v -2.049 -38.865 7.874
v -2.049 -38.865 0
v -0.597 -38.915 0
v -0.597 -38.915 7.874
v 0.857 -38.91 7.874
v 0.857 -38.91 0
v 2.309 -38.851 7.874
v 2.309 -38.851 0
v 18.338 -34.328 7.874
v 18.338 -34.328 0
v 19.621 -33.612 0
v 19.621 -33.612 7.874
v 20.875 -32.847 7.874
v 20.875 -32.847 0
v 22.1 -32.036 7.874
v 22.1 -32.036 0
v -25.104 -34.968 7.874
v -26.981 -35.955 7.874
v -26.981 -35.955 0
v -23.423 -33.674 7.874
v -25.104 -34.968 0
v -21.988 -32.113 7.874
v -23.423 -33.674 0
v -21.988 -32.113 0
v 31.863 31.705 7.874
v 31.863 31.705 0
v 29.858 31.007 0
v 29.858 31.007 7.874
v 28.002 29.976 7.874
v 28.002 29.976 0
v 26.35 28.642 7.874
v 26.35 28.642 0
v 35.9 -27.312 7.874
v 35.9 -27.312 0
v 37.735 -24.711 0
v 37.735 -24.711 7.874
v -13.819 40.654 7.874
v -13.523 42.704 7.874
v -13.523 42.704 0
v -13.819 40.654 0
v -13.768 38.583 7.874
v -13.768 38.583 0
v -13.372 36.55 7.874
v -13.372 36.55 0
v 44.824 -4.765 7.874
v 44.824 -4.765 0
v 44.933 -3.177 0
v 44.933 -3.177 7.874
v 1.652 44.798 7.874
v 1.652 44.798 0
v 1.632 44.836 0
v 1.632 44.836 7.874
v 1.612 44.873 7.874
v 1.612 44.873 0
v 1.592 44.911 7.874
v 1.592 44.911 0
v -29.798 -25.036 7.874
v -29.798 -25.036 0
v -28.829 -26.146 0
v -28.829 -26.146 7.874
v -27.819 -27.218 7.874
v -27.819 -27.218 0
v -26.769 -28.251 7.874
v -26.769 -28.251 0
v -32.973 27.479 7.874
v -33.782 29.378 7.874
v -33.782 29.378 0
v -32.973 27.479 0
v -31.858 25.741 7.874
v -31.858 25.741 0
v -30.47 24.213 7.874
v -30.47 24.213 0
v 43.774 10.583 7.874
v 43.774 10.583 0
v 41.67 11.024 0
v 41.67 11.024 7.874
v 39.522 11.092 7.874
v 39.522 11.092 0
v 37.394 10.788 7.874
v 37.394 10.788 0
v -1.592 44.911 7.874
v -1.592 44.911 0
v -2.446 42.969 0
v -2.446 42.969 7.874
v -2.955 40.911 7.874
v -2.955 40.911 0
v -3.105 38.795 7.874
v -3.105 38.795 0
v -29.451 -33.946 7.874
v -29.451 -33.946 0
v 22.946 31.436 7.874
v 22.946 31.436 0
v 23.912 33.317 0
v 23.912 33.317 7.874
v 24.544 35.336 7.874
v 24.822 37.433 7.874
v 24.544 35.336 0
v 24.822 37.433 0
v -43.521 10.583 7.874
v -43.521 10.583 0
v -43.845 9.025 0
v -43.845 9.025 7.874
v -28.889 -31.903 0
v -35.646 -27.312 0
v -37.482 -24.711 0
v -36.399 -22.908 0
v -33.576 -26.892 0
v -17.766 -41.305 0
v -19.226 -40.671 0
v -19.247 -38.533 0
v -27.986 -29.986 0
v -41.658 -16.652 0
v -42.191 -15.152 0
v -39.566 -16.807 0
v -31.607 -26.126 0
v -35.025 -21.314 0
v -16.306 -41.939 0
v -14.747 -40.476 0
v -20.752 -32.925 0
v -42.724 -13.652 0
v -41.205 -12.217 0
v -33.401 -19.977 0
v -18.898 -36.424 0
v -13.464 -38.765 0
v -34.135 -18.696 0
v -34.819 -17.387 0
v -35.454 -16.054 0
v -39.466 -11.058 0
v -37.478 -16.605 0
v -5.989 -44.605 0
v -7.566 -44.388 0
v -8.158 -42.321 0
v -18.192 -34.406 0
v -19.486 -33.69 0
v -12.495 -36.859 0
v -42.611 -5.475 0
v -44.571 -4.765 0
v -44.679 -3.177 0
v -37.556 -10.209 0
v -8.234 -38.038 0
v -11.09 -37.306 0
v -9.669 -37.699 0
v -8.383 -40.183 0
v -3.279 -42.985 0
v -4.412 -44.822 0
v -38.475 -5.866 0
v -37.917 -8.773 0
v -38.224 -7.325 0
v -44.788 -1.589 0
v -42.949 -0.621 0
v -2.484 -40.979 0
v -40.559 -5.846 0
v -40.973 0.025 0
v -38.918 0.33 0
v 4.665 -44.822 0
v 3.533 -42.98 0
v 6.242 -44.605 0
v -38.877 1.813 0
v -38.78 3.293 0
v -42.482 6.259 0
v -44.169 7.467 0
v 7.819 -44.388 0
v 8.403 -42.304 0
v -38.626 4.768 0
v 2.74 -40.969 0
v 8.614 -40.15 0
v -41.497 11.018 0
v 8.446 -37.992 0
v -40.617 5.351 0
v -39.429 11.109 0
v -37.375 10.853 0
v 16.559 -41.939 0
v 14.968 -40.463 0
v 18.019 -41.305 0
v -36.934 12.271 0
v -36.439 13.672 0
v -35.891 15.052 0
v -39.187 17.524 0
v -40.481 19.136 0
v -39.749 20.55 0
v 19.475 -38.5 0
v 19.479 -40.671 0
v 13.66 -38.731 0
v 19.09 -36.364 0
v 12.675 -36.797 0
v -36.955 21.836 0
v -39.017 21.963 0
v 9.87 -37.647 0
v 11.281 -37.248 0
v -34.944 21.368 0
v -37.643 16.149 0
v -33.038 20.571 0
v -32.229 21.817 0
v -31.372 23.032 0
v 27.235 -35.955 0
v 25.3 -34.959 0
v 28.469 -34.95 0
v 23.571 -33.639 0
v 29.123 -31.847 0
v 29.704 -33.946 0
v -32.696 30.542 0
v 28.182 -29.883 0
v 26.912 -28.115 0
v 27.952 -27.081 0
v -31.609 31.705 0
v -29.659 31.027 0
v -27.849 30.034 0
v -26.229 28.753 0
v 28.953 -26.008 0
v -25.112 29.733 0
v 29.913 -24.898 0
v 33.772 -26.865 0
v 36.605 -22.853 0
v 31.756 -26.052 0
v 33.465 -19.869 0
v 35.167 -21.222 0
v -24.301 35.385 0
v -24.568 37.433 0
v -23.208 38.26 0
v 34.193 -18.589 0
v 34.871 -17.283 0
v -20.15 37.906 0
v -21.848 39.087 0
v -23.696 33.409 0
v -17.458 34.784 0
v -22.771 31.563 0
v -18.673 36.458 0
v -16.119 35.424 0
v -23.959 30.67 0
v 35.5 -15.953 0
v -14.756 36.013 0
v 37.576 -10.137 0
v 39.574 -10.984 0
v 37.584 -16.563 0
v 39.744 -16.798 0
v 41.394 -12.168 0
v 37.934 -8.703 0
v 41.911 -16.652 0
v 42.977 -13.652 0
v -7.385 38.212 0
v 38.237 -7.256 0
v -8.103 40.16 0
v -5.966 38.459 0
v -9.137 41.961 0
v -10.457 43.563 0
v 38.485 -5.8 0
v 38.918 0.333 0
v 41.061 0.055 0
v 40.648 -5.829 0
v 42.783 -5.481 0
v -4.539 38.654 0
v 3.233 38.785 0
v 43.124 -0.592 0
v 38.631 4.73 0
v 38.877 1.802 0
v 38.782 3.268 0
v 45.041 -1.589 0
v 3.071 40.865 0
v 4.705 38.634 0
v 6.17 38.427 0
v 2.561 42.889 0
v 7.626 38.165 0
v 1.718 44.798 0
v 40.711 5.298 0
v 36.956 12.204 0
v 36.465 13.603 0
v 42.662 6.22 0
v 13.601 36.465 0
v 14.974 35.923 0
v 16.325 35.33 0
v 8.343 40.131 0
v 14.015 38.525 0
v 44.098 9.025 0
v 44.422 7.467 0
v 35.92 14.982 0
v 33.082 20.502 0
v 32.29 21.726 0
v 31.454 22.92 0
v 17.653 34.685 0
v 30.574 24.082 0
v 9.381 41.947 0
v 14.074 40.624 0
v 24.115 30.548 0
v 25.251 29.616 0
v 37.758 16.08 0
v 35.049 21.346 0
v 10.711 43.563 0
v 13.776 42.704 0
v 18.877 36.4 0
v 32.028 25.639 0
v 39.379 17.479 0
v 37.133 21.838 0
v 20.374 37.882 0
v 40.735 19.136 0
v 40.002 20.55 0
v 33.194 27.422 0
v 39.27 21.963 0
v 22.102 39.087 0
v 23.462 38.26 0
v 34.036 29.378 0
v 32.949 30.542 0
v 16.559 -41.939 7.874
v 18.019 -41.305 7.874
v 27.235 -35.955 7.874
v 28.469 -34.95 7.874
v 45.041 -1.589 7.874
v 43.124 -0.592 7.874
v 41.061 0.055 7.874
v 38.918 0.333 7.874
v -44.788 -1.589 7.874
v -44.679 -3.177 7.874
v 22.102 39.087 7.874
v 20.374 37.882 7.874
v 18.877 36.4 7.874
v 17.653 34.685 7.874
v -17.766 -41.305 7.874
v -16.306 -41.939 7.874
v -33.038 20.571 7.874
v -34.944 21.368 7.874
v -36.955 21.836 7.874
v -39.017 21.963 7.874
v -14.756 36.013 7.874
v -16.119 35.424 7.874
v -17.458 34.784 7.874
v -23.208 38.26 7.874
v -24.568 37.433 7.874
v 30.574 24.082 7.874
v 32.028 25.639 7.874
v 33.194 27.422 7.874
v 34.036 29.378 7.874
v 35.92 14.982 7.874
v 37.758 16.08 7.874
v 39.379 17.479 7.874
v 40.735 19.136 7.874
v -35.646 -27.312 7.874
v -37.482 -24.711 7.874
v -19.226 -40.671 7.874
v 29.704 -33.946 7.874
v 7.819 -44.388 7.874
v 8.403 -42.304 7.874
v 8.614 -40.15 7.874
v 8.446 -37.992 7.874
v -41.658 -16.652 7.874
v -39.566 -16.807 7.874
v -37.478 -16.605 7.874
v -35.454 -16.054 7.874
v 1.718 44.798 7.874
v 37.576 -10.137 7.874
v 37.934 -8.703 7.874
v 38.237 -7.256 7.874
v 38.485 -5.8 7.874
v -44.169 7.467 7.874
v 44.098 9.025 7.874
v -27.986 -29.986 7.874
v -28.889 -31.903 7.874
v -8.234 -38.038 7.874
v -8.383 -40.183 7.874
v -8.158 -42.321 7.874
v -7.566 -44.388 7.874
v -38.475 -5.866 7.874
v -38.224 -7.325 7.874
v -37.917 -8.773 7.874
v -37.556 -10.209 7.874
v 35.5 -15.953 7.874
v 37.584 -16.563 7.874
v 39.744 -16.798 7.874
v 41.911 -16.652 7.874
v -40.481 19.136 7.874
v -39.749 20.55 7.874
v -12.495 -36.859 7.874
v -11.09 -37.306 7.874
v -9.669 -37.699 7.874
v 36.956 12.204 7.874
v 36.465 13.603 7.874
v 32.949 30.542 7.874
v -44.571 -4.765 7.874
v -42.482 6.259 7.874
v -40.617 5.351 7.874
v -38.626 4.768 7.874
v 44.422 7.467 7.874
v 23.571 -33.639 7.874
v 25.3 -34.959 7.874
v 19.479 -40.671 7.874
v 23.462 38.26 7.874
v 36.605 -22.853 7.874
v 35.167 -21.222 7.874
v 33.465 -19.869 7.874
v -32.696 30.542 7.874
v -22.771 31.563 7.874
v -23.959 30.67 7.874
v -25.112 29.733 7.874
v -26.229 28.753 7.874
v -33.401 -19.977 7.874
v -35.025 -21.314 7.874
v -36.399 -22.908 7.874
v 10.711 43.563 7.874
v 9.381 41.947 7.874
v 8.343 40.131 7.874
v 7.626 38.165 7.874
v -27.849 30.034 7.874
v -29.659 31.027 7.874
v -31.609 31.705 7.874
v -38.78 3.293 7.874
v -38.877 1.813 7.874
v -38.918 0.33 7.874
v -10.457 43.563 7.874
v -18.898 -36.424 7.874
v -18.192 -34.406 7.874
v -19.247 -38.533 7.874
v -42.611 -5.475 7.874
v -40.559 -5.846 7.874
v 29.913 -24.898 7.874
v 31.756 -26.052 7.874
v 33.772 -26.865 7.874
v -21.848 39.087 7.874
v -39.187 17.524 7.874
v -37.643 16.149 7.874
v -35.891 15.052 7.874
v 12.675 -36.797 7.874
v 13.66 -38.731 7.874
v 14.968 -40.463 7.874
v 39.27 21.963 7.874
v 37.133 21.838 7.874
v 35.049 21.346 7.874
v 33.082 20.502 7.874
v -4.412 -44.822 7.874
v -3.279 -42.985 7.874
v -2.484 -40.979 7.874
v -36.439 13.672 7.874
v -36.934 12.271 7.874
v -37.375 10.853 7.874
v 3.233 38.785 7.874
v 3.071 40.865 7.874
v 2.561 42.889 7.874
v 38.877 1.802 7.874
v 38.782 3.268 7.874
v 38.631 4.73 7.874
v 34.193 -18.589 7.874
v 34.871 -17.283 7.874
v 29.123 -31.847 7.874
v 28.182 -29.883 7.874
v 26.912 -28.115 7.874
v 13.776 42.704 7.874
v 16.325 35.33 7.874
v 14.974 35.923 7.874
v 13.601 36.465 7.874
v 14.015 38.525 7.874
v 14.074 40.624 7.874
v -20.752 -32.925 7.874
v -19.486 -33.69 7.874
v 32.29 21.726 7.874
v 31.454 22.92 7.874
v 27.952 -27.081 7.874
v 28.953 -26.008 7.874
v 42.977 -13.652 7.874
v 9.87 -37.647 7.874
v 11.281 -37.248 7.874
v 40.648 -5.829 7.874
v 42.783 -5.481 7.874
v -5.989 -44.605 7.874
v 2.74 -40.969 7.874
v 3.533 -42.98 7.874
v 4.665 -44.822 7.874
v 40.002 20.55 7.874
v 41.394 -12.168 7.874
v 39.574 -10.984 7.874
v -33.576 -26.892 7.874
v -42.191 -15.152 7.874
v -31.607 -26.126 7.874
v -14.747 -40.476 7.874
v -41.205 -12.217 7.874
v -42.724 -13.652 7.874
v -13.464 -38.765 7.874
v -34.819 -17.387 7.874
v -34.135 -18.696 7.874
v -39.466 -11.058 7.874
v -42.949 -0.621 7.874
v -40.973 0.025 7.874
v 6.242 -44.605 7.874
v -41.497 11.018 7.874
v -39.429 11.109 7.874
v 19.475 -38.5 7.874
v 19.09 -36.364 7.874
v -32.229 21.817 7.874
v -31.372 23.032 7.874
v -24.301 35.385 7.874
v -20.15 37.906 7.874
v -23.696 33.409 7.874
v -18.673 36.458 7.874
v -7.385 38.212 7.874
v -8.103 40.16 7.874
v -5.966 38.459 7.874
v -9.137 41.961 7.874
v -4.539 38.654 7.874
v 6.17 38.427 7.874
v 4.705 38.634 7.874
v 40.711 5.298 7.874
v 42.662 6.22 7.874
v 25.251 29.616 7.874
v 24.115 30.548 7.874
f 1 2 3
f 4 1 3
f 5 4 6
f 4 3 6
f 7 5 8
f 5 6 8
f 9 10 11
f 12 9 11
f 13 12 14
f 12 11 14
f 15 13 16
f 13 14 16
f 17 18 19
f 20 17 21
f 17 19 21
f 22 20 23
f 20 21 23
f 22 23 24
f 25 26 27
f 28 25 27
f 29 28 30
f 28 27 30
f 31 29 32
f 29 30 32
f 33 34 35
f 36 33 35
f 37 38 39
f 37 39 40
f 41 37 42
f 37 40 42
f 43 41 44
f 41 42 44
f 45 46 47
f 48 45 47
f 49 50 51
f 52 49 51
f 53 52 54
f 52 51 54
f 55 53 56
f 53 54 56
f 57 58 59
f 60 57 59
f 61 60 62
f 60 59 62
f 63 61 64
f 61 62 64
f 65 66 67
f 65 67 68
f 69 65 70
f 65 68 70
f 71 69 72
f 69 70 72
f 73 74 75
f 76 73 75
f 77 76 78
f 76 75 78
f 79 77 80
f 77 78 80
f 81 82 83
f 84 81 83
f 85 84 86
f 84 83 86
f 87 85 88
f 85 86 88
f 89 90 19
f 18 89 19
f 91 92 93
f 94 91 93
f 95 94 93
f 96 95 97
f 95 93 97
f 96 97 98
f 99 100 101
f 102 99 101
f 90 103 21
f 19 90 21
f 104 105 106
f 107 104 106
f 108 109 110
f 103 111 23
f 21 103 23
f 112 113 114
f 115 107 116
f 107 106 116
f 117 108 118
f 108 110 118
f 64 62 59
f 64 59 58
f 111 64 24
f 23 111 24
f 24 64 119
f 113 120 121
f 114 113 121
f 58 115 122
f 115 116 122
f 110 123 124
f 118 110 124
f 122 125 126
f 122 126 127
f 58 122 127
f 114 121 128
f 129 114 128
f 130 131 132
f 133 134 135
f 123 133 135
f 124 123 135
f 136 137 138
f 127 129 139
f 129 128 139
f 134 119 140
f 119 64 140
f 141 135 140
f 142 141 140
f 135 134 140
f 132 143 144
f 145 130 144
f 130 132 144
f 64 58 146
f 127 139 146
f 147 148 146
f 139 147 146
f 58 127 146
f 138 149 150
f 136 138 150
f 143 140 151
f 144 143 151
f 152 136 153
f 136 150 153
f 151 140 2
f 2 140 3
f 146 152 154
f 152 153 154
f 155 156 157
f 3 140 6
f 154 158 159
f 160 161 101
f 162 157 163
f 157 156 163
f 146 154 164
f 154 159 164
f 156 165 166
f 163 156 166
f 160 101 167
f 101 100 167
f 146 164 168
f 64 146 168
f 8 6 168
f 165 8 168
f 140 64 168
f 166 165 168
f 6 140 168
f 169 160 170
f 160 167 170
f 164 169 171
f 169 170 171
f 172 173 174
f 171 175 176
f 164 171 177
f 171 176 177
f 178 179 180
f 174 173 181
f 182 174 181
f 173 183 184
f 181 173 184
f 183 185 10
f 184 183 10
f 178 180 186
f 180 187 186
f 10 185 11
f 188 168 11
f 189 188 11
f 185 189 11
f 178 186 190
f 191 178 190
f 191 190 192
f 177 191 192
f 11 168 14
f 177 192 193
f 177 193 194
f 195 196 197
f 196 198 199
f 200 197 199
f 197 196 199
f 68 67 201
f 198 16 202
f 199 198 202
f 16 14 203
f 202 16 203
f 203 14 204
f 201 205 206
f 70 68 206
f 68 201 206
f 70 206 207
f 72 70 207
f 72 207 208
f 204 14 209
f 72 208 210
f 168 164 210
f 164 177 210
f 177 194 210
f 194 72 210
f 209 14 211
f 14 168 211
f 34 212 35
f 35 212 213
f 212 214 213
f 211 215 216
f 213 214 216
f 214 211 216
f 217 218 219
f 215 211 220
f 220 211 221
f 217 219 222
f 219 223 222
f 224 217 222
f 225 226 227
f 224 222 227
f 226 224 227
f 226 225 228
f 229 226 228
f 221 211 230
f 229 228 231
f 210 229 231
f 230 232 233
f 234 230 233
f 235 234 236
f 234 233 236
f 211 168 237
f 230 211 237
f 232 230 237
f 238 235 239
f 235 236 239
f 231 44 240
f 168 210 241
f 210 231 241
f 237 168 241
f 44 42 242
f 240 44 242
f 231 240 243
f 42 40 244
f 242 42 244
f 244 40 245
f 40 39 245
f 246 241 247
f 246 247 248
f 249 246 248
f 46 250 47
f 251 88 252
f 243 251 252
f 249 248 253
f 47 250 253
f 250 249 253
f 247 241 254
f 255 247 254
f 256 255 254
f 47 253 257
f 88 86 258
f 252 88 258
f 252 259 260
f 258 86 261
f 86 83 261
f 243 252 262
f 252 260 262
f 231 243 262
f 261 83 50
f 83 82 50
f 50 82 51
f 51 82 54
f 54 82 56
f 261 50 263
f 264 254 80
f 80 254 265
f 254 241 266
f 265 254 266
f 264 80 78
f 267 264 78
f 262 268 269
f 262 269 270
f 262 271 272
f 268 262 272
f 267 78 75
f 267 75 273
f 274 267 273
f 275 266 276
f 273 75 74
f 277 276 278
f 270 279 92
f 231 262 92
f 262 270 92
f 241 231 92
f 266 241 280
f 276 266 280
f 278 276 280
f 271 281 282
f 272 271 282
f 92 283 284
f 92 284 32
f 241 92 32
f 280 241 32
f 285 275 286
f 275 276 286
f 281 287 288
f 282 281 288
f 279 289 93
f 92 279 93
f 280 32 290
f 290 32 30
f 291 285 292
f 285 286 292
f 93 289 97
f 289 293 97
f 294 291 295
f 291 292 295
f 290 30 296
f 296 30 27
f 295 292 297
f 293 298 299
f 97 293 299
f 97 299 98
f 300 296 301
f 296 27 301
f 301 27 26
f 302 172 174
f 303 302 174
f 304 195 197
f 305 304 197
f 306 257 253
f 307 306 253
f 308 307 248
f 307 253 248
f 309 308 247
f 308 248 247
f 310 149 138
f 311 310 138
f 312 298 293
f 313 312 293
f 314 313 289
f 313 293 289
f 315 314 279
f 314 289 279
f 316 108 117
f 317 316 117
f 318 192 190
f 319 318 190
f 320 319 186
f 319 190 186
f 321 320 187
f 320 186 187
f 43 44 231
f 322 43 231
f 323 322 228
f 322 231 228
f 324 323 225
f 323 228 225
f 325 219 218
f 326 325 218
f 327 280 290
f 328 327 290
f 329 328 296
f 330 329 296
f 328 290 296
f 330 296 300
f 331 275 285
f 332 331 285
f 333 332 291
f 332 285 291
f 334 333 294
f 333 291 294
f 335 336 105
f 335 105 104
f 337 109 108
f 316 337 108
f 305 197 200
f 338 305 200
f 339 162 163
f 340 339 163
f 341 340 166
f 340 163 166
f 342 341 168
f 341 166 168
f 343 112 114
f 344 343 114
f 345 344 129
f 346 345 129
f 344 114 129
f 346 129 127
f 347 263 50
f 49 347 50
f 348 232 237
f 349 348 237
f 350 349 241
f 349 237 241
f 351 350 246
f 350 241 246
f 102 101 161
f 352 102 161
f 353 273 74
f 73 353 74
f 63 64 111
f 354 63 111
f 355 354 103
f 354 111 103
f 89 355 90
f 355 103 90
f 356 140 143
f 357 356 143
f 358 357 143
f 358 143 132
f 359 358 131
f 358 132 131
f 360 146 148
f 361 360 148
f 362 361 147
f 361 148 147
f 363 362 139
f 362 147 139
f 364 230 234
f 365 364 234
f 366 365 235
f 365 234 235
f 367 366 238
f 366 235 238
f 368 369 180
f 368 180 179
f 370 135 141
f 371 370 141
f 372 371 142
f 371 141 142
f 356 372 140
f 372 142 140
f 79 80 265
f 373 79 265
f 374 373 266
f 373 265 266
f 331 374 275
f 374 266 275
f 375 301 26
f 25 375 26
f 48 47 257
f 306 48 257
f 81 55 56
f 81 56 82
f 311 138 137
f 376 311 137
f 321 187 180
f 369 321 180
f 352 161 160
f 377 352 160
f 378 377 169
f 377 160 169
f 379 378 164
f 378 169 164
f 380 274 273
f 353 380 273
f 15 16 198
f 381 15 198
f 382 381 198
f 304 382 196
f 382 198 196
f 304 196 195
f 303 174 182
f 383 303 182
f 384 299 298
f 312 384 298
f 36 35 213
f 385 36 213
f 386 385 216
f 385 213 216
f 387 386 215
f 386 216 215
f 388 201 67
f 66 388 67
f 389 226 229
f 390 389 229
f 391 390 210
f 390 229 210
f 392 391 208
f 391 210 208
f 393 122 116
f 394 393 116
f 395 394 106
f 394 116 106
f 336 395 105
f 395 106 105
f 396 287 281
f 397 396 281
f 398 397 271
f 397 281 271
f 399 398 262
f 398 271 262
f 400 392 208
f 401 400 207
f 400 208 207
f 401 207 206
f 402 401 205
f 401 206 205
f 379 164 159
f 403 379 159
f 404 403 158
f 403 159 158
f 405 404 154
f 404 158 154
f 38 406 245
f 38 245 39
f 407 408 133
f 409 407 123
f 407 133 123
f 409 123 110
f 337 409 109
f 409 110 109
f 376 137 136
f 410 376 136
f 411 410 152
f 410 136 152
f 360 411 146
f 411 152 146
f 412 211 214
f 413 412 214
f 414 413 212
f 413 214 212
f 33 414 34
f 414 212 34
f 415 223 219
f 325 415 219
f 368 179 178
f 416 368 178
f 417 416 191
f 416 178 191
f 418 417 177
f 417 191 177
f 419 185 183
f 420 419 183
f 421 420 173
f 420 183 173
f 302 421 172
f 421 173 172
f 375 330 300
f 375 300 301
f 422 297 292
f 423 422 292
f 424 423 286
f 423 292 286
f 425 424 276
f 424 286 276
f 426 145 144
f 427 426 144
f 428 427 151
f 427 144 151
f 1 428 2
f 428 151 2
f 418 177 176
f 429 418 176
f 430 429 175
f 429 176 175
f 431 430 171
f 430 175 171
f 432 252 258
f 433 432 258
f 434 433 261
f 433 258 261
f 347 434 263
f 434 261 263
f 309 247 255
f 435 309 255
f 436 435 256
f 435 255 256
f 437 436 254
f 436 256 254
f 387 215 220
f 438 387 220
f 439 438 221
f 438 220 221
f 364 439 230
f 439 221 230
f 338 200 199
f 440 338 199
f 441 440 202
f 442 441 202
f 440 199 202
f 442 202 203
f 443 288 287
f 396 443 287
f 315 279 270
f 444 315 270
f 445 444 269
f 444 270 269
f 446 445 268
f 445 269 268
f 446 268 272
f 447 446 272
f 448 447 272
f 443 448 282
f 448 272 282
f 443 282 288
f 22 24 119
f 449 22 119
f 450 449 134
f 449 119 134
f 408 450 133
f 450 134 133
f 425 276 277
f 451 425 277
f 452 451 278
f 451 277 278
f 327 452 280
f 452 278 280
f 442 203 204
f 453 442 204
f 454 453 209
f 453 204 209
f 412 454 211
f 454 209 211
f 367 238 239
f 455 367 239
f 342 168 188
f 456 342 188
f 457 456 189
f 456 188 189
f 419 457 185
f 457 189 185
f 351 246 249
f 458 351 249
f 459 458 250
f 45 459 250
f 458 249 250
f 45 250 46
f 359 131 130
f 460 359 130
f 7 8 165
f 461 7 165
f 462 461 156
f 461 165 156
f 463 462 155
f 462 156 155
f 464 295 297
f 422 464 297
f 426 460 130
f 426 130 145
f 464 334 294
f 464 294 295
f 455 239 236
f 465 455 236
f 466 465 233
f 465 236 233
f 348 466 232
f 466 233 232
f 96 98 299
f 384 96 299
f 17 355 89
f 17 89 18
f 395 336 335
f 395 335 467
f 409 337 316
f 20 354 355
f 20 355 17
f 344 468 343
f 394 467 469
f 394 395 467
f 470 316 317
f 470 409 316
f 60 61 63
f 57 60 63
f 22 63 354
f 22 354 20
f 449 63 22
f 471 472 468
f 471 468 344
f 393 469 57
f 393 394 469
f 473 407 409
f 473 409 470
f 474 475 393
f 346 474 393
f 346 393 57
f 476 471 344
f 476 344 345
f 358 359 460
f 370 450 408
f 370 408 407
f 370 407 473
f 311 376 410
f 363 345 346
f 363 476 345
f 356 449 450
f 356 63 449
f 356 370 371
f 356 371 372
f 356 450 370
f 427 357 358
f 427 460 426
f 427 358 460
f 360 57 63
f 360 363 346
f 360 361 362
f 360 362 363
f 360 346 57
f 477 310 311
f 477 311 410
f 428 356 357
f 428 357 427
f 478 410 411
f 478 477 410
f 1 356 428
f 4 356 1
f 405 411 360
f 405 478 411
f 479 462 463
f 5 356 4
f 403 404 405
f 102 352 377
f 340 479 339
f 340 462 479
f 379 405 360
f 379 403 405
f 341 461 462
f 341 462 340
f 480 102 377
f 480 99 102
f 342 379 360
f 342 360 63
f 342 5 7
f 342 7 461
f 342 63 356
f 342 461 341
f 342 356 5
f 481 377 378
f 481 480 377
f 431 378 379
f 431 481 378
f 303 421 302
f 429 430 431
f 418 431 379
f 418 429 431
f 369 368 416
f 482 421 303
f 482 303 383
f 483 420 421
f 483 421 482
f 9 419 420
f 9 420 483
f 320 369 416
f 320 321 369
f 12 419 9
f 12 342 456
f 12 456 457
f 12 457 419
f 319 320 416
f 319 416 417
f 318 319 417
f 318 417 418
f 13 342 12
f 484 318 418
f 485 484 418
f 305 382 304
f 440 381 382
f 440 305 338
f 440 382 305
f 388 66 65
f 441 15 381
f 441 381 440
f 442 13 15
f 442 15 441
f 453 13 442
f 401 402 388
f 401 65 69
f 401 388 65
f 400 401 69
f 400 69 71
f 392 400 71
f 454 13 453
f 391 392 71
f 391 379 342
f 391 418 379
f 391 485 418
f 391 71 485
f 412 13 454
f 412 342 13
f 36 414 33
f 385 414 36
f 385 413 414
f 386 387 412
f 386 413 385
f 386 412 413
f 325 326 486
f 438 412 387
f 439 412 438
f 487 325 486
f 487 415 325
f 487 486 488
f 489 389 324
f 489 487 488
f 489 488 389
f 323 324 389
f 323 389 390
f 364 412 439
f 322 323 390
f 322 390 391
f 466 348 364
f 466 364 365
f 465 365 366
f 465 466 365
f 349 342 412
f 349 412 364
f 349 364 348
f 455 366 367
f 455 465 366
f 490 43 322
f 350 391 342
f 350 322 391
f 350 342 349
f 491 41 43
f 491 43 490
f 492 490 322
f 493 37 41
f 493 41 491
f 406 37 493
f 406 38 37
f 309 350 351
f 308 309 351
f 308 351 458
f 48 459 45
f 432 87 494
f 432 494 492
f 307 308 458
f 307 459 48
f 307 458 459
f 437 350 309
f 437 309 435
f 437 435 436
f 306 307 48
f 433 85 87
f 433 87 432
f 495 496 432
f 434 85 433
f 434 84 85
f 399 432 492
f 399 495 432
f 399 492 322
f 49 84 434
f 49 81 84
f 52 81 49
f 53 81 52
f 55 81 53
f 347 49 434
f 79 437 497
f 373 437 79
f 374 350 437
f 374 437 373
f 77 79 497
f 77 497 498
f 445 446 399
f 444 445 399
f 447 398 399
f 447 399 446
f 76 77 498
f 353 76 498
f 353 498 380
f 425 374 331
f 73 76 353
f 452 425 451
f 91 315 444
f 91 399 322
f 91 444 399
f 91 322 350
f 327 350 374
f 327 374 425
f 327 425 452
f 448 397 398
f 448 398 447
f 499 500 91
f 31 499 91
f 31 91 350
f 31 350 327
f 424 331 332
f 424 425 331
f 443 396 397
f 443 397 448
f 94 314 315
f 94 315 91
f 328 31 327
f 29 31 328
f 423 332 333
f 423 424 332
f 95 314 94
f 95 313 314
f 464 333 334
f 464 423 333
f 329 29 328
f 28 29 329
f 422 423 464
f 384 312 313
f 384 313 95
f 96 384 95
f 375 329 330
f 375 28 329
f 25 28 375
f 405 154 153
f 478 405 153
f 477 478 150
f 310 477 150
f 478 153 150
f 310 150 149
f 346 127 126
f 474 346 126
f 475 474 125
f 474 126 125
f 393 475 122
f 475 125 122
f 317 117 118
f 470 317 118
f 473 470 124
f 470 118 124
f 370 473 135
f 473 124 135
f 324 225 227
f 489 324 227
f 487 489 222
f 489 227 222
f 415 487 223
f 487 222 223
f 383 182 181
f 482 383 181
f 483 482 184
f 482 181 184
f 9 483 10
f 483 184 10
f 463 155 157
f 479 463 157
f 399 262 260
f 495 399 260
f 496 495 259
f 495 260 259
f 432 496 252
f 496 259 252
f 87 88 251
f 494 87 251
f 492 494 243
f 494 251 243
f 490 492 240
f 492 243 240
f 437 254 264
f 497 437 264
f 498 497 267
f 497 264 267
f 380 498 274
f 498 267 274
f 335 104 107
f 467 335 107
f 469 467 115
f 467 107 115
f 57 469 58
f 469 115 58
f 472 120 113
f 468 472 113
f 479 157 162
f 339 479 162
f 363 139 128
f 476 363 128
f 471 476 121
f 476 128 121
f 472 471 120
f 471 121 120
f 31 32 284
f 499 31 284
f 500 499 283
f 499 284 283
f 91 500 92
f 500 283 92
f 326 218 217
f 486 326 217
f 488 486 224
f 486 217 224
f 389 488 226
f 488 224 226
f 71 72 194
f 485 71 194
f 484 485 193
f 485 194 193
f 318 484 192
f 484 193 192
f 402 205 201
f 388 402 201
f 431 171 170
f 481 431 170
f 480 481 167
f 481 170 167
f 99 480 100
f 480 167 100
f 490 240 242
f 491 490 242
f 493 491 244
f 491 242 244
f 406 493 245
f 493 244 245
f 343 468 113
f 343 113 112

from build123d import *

# Parameters (mm, degrees)
F1_DEPTH = 7.874


with BuildPart() as f1:
    # F0 (on Top) → F1 (new body)
    with BuildSketch(Plane.XY):
        with BuildLine():
            ThreePointArc((-21.988282, -32.112589), (-20.122802, -33.313297), (-18.191936, -34.405761))
            ThreePointArc((-18.191936, -34.405761), (-15.392188, -35.746097), (-12.49453, -36.859051))
            ThreePointArc((-12.49453, -36.859051), (-10.38103, -37.509161), (-8.23402, -38.038189))
            ThreePointArc((-8.23402, -38.038189), (-5.158169, -38.57585), (-2.049116, -38.865204))
            ThreePointArc((-2.049116, -38.865204), (0.130137, -38.918967), (2.308982, -38.850631))
            ThreePointArc((2.308982, -38.850631), (5.394442, -38.54352), (8.445662, -37.991758))
            ThreePointArc((8.445662, -37.991758), (10.577407, -37.454257), (12.6754, -36.797244))
            ThreePointArc((12.6754, -36.797244), (15.555857, -35.675177), (18.338174, -34.32804))
            ThreePointArc((18.338174, -34.32804), (20.251315, -33.23533), (22.099557, -32.036113))
            ThreePointArc((22.099557, -32.036113), (24.583975, -30.171694), (26.911797, -28.115087))
            ThreePointArc((26.911797, -28.115087), (28.45789, -26.549038), (29.912996, -24.898104))
            ThreePointArc((29.912996, -24.898104), (31.788771, -22.453885), (33.465324, -19.868947))
            ThreePointArc((33.465324, -19.868947), (34.538009, -17.939589), (35.499579, -15.952517))
            ThreePointArc((35.499579, -15.952517), (36.653309, -13.08579), (37.575963, -10.136565))
            ThreePointArc((37.575963, -10.136565), (38.092075, -7.981021), (38.484642, -5.799592))
            ThreePointArc((38.484642, -5.799592), (38.822474, -2.741983), (38.917762, 0.332757))
            ThreePointArc((38.917762, 0.332757), (38.836506, 2.535497), (38.630675, 4.730104))
            ThreePointArc((38.630675, 4.730104), (38.132925, 7.783505), (37.394224, 10.787723))
            ThreePointArc((37.394224, 10.787723), (36.717077, 12.905781), (35.920069, 14.981708))
            ThreePointArc((35.920069, 14.981708), (34.611011, 17.798339), (33.081518, 20.501612))
            ThreePointArc((33.081518, 20.501612), (31.877893, 22.327178), (30.57364, 24.082264))
            ThreePointArc((30.57364, 24.082264), (28.552974, 26.44675), (26.349949, 28.64233))
            ThreePointArc((26.349949, 28.64233), (24.687381, 30.087142), (22.945739, 31.435584))
            ThreePointArc((22.945739, 31.435584), (20.364289, 33.166228), (17.652979, 34.685375))
            ThreePointArc((17.652979, 34.685375), (15.652159, 35.63303), (13.600691, 36.465383))
            ThreePointArc((13.600691, 36.465383), (10.647237, 37.434466), (7.625866, 38.164762))
            ThreePointArc((7.625866, 38.164762), (5.438195, 38.537371), (3.232843, 38.784683))
            ThreePointArc((3.232843, 38.784683), (3.168915, 38.789959), (3.104978, 38.795129))
            ThreePointArc((3.104978, 38.795129), (2.759904, 41.889046), (1.652397, 44.798484))
            ThreePointArc((1.652397, 44.798484), (1.622209, 44.854723), (1.591731, 44.910806))
            Line((1.591731, 44.910806), (0, 44.910806))
            Line((0, 44.910806), (-1.591731, 44.910806))
            ThreePointArc((-1.591731, 44.910806), (-2.744733, 41.951046), (-3.104978, 38.795129))
            ThreePointArc((-3.104978, 38.795129), (-5.253249, 38.563017), (-7.385327, 38.212038))
            ThreePointArc((-7.385327, 38.212038), (-10.411659, 37.50067), (-13.371558, 36.550025))
            ThreePointArc((-13.371558, 36.550025), (-15.440243, 35.725366), (-17.458373, 34.783734))
            ThreePointArc((-17.458373, 34.783734), (-20.178984, 33.279295), (-22.770837, 31.562508))
            ThreePointArc((-22.770837, 31.562508), (-24.54028, 30.207243), (-26.229241, 28.75291))
            ThreePointArc((-26.229241, 28.75291), (-28.440519, 26.567646), (-30.470322, 24.212856))
            ThreePointArc((-30.470322, 24.212856), (-31.806505, 22.428757), (-33.03836, 20.571089))
            ThreePointArc((-33.03836, 20.571089), (-34.574865, 17.868453), (-35.890753, 15.051802))
            ThreePointArc((-35.890753, 15.051802), (-36.693081, 12.973848), (-37.375215, 10.853397))
            ThreePointArc((-37.375215, 10.853397), (-38.122243, 7.835654), (-38.626026, 4.767914))
            ThreePointArc((-38.626026, 4.767914), (-38.835335, 2.55337), (-38.917781, 0.330485))
            ThreePointArc((-38.917781, 0.330485), (-38.820007, -2.776685), (-38.474554, -5.866139))
            ThreePointArc((-38.474554, -5.866139), (-38.077464, -8.050446), (-37.556468, -10.208557))
            ThreePointArc((-37.556468, -10.208557), (-36.62198, -13.173212), (-35.453876, -16.053834))
            ThreePointArc((-35.453876, -16.053834), (-34.483186, -18.044745), (-33.400808, -19.977211))
            ThreePointArc((-33.400808, -19.977211), (-31.70024, -22.578701), (-29.79751, -25.0362))
            ThreePointArc((-29.79751, -25.0362), (-28.32882, -26.686718), (-26.768837, -28.251235))
            ThreePointArc((-26.768837, -28.251235), (-24.454891, -30.276414), (-21.988282, -32.112589))
        make_face()
        with BuildLine():
            ThreePointArc((-12.49453, -36.859051), (-15.392188, -35.746097), (-18.191936, -34.405761))
            ThreePointArc((-18.191936, -34.405761), (-19.118216, -37.470766), (-19.225736, -40.670874))
            Line((-19.225736, -40.670874), (-17.765783, -41.305022))
            Line((-17.765783, -41.305022), (-16.305829, -41.939169))
            ThreePointArc((-16.305829, -41.939169), (-14.068175, -39.648193), (-12.49453, -36.859051))
        make_face()
        with BuildLine():
            ThreePointArc((-26.981213, -35.954664), (-24.235731, -34.357234), (-21.988282, -32.112589))
            ThreePointArc((-21.988282, -32.112589), (-24.454891, -30.276414), (-26.768837, -28.251235))
            ThreePointArc((-26.768837, -28.251235), (-28.47847, -30.924775), (-29.450661, -33.94562))
            Line((-29.450661, -33.94562), (-28.215937, -34.950142))
            Line((-28.215937, -34.950142), (-26.981213, -35.954664))
        make_face()
        with BuildLine():
            ThreePointArc((-2.049116, -38.865204), (-5.158169, -38.57585), (-8.23402, -38.038189))
            ThreePointArc((-8.23402, -38.038189), (-8.317071, -41.257069), (-7.565528, -44.388087))
            Line((-7.565528, -44.388087), (-5.988623, -44.604827))
            Line((-5.988623, -44.604827), (-4.411717, -44.821568))
            ThreePointArc((-4.411717, -44.821568), (-2.837532, -41.999224), (-2.049116, -38.865204))
        make_face()
        with BuildLine():
            ThreePointArc((-35.646125, -27.311897), (-32.574912, -26.551602), (-29.79751, -25.0362))
            ThreePointArc((-29.79751, -25.0362), (-31.70024, -22.578701), (-33.400808, -19.977211))
            ThreePointArc((-33.400808, -19.977211), (-35.745696, -22.081808), (-37.481965, -24.711105))
            Line((-37.481965, -24.711105), (-36.564045, -26.011501))
            Line((-36.564045, -26.011501), (-35.646125, -27.311897))
        make_face()
        with BuildLine():
            ThreePointArc((8.445662, -37.991758), (5.394442, -38.54352), (2.308982, -38.850631))
            ThreePointArc((2.308982, -38.850631), (3.092523, -41.991796), (4.66518, -44.821568))
            Line((4.66518, -44.821568), (6.242085, -44.604827))
            Line((6.242085, -44.604827), (7.818991, -44.388087))
            ThreePointArc((7.818991, -44.388087), (8.555536, -41.231386), (8.445662, -37.991758))
        make_face()
        with BuildLine():
            ThreePointArc((-41.657928, -16.651862), (-38.51757, -16.750514), (-35.453876, -16.053834))
            ThreePointArc((-35.453876, -16.053834), (-36.62198, -13.173212), (-37.556468, -10.208557))
            ThreePointArc((-37.556468, -10.208557), (-40.360127, -11.600417), (-42.724005, -13.65221))
            Line((-42.724005, -13.65221), (-42.190966, -15.152036))
            Line((-42.190966, -15.152036), (-41.657928, -16.651862))
        make_face()
        with BuildLine():
            ThreePointArc((18.338174, -34.32804), (15.555857, -35.675177), (12.6754, -36.797244))
            ThreePointArc((12.6754, -36.797244), (14.276204, -39.625884), (16.559292, -41.939169))
            Line((16.559292, -41.939169), (18.019246, -41.305022))
            Line((18.019246, -41.305022), (19.479199, -40.670874))
            ThreePointArc((19.479199, -40.670874), (19.329553, -37.423746), (18.338174, -34.32804))
        make_face()
        with BuildLine():
            ThreePointArc((-44.570754, -4.765165), (-41.59278, -5.703944), (-38.474554, -5.866139))
            ThreePointArc((-38.474554, -5.866139), (-38.820007, -2.776685), (-38.917781, 0.330485))
            ThreePointArc((-38.917781, 0.330485), (-41.974778, -0.256587), (-44.788001, -1.589124))
            Line((-44.788001, -1.589124), (-44.679377, -3.177144))
            Line((-44.679377, -3.177144), (-44.570754, -4.765165))
        make_face()
        with BuildLine():
            ThreePointArc((26.911797, -28.115087), (24.583975, -30.171694), (22.099557, -32.036113))
            ThreePointArc((22.099557, -32.036113), (24.40649, -34.33693), (27.234676, -35.954664))
            Line((27.234676, -35.954664), (28.4694, -34.950142))
            Line((28.4694, -34.950142), (29.704123, -33.94562))
            ThreePointArc((29.704123, -33.94562), (28.69608, -30.844477), (26.911797, -28.115087))
        make_face()
        with BuildLine():
            ThreePointArc((-44.168572, 7.466613), (-41.568326, 5.766012), (-38.626026, 4.767914))
            ThreePointArc((-38.626026, 4.767914), (-38.122243, 7.835654), (-37.375215, 10.853397))
            ThreePointArc((-37.375215, 10.853397), (-40.465114, 11.107065), (-43.520877, 10.583489))
            Line((-43.520877, 10.583489), (-43.844724, 9.025051))
            Line((-43.844724, 9.025051), (-44.168572, 7.466613))
        make_face()
        with BuildLine():
            ThreePointArc((33.465324, -19.868947), (31.788771, -22.453885), (29.912996, -24.898104))
            ThreePointArc((29.912996, -24.898104), (32.745866, -26.502884), (35.899588, -27.311897))
            Line((35.899588, -27.311897), (36.817508, -26.011501))
            Line((36.817508, -26.011501), (37.735428, -24.711105))
            ThreePointArc((37.735428, -24.711105), (35.922256, -22.006173), (33.465324, -19.868947))
        make_face()
        with BuildLine():
            ThreePointArc((-40.481209, 19.136295), (-38.44396, 16.804113), (-35.890753, 15.051802))
            ThreePointArc((-35.890753, 15.051802), (-34.574865, 17.868453), (-33.03836, 20.571089))
            ThreePointArc((-33.03836, 20.571089), (-35.939676, 21.644147), (-39.01661, 21.962843))
            Line((-39.01661, 21.962843), (-39.74891, 20.549569))
            Line((-39.74891, 20.549569), (-40.481209, 19.136295))
        make_face()
        with BuildLine():
            ThreePointArc((37.575963, -10.136565), (36.653309, -13.08579), (35.499579, -15.952517))
            ThreePointArc((35.499579, -15.952517), (38.659043, -16.727988), (41.911391, -16.651862))
            Line((41.911391, -16.651862), (42.444429, -15.152036))
            Line((42.444429, -15.152036), (42.977467, -13.65221))
            ThreePointArc((42.977467, -13.65221), (40.509996, -11.53597), (37.575963, -10.136565))
        make_face()
        with BuildLine():
            ThreePointArc((-33.782142, 29.378395), (-32.452023, 26.586749), (-30.470322, 24.212856))
            ThreePointArc((-30.470322, 24.212856), (-28.440519, 26.567646), (-26.229241, 28.75291))
            ThreePointArc((-26.229241, 28.75291), (-28.733041, 30.568305), (-31.60926, 31.704984))
            Line((-31.60926, 31.704984), (-32.695701, 30.541689))
            Line((-32.695701, 30.541689), (-33.782142, 29.378395))
        make_face()
        with BuildLine():
            ThreePointArc((38.917762, 0.332757), (38.822474, -2.741983), (38.484642, -5.799592))
            ThreePointArc((38.484642, -5.799592), (41.722833, -5.701593), (44.824217, -4.765165))
            Line((44.824217, -4.765165), (44.93284, -3.177144))
            Line((44.93284, -3.177144), (45.041464, -1.589124))
            ThreePointArc((45.041464, -1.589124), (42.106594, -0.223584), (38.917762, 0.332757))
        make_face()
        with BuildLine():
            ThreePointArc((-24.568208, 37.433304), (-24.040028, 34.384474), (-22.770837, 31.562508))
            ThreePointArc((-22.770837, 31.562508), (-20.178984, 33.279295), (-17.458373, 34.783734))
            ThreePointArc((-17.458373, 34.783734), (-19.381329, 37.212958), (-21.848197, 39.08738))
            Line((-21.848197, 39.08738), (-23.208203, 38.260342))
            Line((-23.208203, 38.260342), (-24.568208, 37.433304))
        make_face()
        with BuildLine():
            ThreePointArc((37.394224, 10.787723), (38.132925, 7.783505), (38.630675, 4.730104))
            ThreePointArc((38.630675, 4.730104), (41.706783, 5.716511), (44.422035, 7.466613))
            Line((44.422035, 7.466613), (44.098187, 9.025051))
            Line((44.098187, 9.025051), (43.77434, 10.583489))
            ThreePointArc((43.77434, 10.583489), (40.5977, 11.10478), (37.394224, 10.787723))
        make_face()
        with BuildLine():
            ThreePointArc((-13.522764, 42.703625), (-13.836538, 39.617258), (-13.371558, 36.550025))
            ThreePointArc((-13.371558, 36.550025), (-10.411659, 37.50067), (-7.385327, 38.212038))
            ThreePointArc((-7.385327, 38.212038), (-8.581975, 41.082126), (-10.457354, 43.562513))
            Line((-10.457354, 43.562513), (-11.990059, 43.133069))
            Line((-11.990059, 43.133069), (-13.522764, 42.703625))
        make_face()
        with BuildLine():
            ThreePointArc((33.081518, 20.501612), (34.611011, 17.798339), (35.920069, 14.981708))
            ThreePointArc((35.920069, 14.981708), (38.599262, 16.743916), (40.734672, 19.136295))
            Line((40.734672, 19.136295), (40.002373, 20.549569))
            Line((40.002373, 20.549569), (39.270073, 21.962843))
            ThreePointArc((39.270073, 21.962843), (36.080176, 21.637191), (33.081518, 20.501612))
        make_face()
        with BuildLine():
            ThreePointArc((26.349949, 28.64233), (28.552974, 26.44675), (30.57364, 24.082264))
            ThreePointArc((30.57364, 24.082264), (32.649413, 26.504948), (34.035605, 29.378395))
            Line((34.035605, 29.378395), (32.949164, 30.541689))
            Line((32.949164, 30.541689), (31.862723, 31.704984))
            ThreePointArc((31.862723, 31.704984), (28.907631, 30.531327), (26.349949, 28.64233))
        make_face()
        with BuildLine():
            ThreePointArc((17.652979, 34.685375), (20.364289, 33.166228), (22.945739, 31.435584))
            ThreePointArc((22.945739, 31.435584), (24.271426, 34.313175), (24.821671, 37.433304))
            Line((24.821671, 37.433304), (23.461666, 38.260342))
            Line((23.461666, 38.260342), (22.10166, 39.08738))
            ThreePointArc((22.10166, 39.08738), (19.59396, 37.172741), (17.652979, 34.685375))
        make_face()
        with BuildLine():
            Line((1.718462, 44.798484), (1.652397, 44.798484))
            ThreePointArc((1.652397, 44.798484), (2.759904, 41.889046), (3.104978, 38.795129))
            ThreePointArc((3.104978, 38.795129), (3.168915, 38.789959), (3.232843, 38.784683))
            ThreePointArc((3.232843, 38.784683), (2.859126, 41.888149), (1.718462, 44.798484))
        make_face()
        with BuildLine():
            ThreePointArc((7.625866, 38.164762), (10.647237, 37.434466), (13.600691, 36.465383))
            ThreePointArc((13.600691, 36.465383), (14.088841, 39.573238), (13.776227, 42.703625))
            Line((13.776227, 42.703625), (12.243522, 43.133069))
            Line((12.243522, 43.133069), (10.710817, 43.562513))
            ThreePointArc((10.710817, 43.562513), (8.823257, 41.060862), (7.625866, 38.164762))
        make_face()
    extrude(amount=F1_DEPTH)


solid = f1.part
